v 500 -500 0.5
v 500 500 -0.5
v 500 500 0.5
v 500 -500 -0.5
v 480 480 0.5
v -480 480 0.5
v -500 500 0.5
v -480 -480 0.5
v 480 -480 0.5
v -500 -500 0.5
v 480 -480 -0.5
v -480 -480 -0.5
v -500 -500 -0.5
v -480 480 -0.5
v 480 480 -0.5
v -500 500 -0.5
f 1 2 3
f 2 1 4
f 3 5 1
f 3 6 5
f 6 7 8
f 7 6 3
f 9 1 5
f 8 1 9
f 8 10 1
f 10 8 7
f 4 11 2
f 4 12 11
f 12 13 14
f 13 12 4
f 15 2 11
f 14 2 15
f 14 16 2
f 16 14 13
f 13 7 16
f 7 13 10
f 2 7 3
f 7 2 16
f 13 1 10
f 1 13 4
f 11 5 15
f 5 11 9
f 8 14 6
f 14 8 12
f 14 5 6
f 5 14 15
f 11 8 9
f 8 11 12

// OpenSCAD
// file: lib.scad
function x(v) = v[0];
function y(v) = v[1];
function z(v) = v[2];
function add(v1,v2) = [ for (i = [ 0 : len(v1)-1 ]) v1[i] + v2[i] ];
function xv(d) = [d,0,0];
function yv(d) = [0,d,0];
function zv(d) = [0,0,d];

module box(v) { cube(size=v, center=true); }
module cyl(r1,r2,h) { cylinder(r1=r1, r2=r2, h=h, center=true); }

function grow(n,v) = [x(v)+n*2, y(v)+n*2, z(v)+n*2];

module rbox(v, radius=1) {
	cx = x(v)/2-radius;
	cy = y(v)/2-radius;
	cz = z(v)/2-radius;

	hull() {
		translate([cx,cy,cz]) sphere(r=radius);
		translate([cx,cy,-cz]) sphere(r=radius);
		translate([cx,-cy,cz]) sphere(r=radius);
		translate([cx,-cy,-cz]) sphere(r=radius);
		translate([-cx,cy,cz]) sphere(r=radius);
		translate([-cx,cy,-cz]) sphere(r=radius);
		translate([-cx,-cy,cz]) sphere(r=radius);
		translate([-cx,-cy,-cz]) sphere(r=radius);
	}
}

module fillet(r=1) {
  minkowski() {
    difference() {
      children();
      minkowski() {
        difference() {
          minkowski() {
            children();
            sphere(r=r);
          }
          children();
        }
        sphere(r=r);
      }
    }
    sphere(r=r);
  }
}
// main file
use <lib.scad>

module square() {
	difference() {
		box([1000,1000,1]);
		box([960,960,20]);
	}
}

square();
